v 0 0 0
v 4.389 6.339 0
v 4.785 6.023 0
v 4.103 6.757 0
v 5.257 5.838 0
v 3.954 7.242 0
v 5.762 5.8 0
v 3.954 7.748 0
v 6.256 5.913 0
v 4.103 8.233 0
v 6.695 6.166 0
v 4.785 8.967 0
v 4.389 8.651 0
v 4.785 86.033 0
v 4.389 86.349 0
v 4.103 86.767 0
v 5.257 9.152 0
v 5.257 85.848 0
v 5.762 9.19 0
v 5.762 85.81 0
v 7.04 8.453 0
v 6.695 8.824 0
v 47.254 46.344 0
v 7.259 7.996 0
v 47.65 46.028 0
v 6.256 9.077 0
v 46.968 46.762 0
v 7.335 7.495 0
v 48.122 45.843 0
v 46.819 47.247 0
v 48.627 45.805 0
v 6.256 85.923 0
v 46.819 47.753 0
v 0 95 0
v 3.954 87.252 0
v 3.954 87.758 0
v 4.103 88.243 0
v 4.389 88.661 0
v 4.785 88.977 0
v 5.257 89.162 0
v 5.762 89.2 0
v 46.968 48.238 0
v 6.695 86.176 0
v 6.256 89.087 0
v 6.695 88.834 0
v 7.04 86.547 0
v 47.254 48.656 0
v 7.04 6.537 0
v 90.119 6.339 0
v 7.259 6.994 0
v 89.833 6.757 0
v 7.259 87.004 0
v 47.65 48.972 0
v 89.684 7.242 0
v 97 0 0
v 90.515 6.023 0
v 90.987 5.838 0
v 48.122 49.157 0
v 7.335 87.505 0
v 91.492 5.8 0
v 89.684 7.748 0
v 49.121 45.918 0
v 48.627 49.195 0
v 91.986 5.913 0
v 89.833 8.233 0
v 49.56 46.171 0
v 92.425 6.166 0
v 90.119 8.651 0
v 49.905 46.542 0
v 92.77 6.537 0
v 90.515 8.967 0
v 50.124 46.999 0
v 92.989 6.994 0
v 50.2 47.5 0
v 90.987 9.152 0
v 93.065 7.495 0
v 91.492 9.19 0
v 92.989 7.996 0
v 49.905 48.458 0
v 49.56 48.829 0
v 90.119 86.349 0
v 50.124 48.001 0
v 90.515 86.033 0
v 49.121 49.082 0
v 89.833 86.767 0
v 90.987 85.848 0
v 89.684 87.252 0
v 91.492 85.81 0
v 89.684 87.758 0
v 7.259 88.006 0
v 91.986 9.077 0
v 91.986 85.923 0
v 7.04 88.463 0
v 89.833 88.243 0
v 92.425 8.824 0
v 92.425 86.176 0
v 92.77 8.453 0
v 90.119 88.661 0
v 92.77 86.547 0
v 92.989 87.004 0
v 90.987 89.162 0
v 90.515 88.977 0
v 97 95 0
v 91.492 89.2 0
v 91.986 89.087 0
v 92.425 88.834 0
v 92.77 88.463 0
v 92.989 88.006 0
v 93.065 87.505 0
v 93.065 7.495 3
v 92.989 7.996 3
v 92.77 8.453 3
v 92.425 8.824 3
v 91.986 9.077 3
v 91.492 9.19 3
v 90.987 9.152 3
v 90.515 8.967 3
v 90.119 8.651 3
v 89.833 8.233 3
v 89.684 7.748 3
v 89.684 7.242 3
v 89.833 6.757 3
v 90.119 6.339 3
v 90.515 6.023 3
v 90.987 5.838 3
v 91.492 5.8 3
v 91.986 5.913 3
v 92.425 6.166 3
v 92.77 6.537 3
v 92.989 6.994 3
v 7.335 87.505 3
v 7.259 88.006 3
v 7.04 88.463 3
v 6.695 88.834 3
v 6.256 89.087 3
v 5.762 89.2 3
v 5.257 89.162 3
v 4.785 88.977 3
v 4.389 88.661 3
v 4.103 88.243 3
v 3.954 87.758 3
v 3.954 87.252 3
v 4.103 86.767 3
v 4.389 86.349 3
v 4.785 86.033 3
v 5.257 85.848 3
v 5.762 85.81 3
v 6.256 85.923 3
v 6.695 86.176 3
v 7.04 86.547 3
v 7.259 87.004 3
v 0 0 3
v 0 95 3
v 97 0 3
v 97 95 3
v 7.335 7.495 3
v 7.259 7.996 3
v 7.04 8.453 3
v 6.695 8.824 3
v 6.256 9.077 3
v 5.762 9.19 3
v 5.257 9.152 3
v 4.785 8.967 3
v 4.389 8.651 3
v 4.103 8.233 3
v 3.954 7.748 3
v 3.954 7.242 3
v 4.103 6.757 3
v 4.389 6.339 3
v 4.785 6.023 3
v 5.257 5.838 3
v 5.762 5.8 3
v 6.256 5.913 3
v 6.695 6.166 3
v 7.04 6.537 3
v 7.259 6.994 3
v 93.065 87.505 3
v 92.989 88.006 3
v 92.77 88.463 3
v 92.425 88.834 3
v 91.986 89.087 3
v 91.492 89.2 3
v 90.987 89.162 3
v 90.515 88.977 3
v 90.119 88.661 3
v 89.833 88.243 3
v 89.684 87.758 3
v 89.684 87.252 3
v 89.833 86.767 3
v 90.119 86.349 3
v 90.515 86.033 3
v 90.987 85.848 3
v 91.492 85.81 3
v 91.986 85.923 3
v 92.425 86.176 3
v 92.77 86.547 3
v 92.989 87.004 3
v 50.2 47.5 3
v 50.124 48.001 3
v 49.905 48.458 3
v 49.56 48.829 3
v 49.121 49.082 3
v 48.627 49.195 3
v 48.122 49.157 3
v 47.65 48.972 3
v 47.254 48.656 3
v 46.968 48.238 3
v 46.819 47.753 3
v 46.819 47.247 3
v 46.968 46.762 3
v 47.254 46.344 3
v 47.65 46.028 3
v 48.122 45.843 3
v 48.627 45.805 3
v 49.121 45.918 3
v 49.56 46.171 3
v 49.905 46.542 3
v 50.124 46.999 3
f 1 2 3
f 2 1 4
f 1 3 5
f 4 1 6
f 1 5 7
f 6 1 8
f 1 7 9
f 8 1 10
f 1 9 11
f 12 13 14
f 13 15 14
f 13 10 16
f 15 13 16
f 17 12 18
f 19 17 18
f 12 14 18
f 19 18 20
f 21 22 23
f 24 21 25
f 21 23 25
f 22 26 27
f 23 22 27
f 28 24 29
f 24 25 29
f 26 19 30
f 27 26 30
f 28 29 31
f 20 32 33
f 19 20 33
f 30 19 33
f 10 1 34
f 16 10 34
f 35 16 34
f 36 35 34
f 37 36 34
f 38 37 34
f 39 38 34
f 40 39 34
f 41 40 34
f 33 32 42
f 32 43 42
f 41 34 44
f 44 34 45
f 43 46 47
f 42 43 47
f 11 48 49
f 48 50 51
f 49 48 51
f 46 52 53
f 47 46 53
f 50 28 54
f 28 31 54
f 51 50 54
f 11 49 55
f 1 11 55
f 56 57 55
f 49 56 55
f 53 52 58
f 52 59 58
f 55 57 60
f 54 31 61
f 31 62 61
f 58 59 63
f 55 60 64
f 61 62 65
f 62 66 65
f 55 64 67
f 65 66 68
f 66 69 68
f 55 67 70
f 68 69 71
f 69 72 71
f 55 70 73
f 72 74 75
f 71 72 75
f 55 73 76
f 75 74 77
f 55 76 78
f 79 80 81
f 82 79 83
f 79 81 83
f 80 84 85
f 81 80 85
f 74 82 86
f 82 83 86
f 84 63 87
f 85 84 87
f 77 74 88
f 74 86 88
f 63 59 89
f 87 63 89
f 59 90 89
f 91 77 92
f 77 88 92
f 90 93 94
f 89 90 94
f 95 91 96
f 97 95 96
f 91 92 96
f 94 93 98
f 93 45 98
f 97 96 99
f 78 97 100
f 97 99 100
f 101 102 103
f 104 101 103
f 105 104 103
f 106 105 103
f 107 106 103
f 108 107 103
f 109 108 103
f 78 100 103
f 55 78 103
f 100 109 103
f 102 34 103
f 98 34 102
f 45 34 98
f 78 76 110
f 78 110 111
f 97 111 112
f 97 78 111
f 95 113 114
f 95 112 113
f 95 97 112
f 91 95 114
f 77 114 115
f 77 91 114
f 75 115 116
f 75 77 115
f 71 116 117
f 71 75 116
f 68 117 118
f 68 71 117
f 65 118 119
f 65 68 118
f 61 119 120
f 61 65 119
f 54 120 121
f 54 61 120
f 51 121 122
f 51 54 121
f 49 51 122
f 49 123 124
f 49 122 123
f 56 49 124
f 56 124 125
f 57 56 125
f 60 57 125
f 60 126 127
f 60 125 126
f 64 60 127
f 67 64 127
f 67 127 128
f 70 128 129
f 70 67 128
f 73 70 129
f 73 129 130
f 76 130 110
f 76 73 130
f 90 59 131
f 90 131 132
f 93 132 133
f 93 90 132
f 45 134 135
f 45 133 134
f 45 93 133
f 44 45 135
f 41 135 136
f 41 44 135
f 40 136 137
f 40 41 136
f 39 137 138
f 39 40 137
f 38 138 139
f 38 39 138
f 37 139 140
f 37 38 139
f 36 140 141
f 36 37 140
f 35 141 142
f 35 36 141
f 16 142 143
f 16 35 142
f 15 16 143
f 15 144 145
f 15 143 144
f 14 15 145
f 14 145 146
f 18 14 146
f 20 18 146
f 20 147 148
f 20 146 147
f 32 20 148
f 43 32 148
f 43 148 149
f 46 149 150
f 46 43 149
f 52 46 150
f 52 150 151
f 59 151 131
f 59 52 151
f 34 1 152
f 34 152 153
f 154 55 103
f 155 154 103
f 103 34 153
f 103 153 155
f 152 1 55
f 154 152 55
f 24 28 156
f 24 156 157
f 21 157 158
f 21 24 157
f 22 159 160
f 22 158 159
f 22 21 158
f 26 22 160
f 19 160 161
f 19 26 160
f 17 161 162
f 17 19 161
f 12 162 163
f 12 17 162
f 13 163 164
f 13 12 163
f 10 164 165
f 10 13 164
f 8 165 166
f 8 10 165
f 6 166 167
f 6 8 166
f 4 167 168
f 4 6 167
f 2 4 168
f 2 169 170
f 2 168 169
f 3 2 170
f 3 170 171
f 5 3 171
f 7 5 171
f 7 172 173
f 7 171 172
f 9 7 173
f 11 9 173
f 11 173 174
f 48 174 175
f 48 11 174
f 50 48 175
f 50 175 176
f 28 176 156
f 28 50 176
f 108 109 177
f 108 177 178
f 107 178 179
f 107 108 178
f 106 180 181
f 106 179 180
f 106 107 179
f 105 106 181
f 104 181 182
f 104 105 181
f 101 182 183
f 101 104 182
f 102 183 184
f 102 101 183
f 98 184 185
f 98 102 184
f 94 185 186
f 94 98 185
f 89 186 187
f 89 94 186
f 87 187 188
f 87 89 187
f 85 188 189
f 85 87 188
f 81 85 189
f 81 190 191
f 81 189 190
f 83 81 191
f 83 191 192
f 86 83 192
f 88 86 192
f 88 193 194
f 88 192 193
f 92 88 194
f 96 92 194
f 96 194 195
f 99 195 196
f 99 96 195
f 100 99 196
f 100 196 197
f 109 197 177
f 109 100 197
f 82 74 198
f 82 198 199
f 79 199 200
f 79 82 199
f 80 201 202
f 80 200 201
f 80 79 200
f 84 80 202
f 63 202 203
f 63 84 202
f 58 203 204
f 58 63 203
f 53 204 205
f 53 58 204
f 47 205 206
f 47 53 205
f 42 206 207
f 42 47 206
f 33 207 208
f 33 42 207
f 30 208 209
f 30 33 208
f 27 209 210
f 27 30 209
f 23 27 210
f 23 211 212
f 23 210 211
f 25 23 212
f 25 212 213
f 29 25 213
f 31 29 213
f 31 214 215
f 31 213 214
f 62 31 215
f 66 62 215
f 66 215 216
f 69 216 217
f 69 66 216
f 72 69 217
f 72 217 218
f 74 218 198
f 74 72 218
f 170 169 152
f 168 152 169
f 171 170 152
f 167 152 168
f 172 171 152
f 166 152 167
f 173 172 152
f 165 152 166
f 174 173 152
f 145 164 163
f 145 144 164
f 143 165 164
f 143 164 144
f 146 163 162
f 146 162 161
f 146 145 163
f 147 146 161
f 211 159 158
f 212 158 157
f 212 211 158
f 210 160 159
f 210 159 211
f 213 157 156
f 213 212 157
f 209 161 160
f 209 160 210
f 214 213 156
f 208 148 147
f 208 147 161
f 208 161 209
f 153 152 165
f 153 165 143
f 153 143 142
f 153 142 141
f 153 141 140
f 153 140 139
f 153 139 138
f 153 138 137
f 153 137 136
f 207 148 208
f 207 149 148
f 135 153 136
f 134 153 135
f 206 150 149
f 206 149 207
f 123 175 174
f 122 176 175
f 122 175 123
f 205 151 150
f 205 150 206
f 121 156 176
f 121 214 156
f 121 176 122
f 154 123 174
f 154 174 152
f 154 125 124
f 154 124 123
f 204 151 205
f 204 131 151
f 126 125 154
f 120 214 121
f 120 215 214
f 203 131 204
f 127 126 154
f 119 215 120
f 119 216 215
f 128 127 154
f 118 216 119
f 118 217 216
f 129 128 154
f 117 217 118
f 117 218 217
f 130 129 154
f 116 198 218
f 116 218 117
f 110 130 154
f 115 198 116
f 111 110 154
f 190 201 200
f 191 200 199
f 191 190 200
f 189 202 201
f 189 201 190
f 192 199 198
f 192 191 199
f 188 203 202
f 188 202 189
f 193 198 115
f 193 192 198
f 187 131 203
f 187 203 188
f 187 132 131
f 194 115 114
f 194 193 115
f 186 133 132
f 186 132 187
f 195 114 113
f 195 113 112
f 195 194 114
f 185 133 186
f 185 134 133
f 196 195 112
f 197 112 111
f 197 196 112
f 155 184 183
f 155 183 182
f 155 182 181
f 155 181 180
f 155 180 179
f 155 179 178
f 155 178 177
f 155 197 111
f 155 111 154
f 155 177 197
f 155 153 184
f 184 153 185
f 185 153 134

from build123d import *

# Parameters (mm, degrees)
BODY_SKETCH_W    = 97
BODY_SKETCH_H    = 95
BODY_DEPTH       = 3
HOLES_DEPTH      = 136.805007271
HOLES_DEPTH_BACK = 136.805007271
HOLES_SKETCH_R   = 1.7


with BuildPart() as part:
    # Body sketch → Body (new body)
    with BuildSketch(Plane.XY):
        with Locations((48.5, 47.5)):
            Rectangle(BODY_SKETCH_W, BODY_SKETCH_H)
    extrude(amount=BODY_DEPTH)

    # Holes sketch → Holes (cut, two sides: drawn at the far end of the back side and taken through both)
    with BuildSketch(Plane.XY.offset(-HOLES_DEPTH_BACK)):
        with Locations((5.635, 7.495)):
            Circle(HOLES_SKETCH_R)
        with Locations((91.365, 7.495)):
            Circle(HOLES_SKETCH_R)
        with Locations((5.635, 87.505)):
            Circle(HOLES_SKETCH_R)
        with Locations((91.365, 87.505)):
            Circle(HOLES_SKETCH_R)
        with Locations((48.5, 47.5)):
            Circle(HOLES_SKETCH_R)
    extrude(amount=HOLES_DEPTH + HOLES_DEPTH_BACK, mode=Mode.SUBTRACT)


solid = part.part
